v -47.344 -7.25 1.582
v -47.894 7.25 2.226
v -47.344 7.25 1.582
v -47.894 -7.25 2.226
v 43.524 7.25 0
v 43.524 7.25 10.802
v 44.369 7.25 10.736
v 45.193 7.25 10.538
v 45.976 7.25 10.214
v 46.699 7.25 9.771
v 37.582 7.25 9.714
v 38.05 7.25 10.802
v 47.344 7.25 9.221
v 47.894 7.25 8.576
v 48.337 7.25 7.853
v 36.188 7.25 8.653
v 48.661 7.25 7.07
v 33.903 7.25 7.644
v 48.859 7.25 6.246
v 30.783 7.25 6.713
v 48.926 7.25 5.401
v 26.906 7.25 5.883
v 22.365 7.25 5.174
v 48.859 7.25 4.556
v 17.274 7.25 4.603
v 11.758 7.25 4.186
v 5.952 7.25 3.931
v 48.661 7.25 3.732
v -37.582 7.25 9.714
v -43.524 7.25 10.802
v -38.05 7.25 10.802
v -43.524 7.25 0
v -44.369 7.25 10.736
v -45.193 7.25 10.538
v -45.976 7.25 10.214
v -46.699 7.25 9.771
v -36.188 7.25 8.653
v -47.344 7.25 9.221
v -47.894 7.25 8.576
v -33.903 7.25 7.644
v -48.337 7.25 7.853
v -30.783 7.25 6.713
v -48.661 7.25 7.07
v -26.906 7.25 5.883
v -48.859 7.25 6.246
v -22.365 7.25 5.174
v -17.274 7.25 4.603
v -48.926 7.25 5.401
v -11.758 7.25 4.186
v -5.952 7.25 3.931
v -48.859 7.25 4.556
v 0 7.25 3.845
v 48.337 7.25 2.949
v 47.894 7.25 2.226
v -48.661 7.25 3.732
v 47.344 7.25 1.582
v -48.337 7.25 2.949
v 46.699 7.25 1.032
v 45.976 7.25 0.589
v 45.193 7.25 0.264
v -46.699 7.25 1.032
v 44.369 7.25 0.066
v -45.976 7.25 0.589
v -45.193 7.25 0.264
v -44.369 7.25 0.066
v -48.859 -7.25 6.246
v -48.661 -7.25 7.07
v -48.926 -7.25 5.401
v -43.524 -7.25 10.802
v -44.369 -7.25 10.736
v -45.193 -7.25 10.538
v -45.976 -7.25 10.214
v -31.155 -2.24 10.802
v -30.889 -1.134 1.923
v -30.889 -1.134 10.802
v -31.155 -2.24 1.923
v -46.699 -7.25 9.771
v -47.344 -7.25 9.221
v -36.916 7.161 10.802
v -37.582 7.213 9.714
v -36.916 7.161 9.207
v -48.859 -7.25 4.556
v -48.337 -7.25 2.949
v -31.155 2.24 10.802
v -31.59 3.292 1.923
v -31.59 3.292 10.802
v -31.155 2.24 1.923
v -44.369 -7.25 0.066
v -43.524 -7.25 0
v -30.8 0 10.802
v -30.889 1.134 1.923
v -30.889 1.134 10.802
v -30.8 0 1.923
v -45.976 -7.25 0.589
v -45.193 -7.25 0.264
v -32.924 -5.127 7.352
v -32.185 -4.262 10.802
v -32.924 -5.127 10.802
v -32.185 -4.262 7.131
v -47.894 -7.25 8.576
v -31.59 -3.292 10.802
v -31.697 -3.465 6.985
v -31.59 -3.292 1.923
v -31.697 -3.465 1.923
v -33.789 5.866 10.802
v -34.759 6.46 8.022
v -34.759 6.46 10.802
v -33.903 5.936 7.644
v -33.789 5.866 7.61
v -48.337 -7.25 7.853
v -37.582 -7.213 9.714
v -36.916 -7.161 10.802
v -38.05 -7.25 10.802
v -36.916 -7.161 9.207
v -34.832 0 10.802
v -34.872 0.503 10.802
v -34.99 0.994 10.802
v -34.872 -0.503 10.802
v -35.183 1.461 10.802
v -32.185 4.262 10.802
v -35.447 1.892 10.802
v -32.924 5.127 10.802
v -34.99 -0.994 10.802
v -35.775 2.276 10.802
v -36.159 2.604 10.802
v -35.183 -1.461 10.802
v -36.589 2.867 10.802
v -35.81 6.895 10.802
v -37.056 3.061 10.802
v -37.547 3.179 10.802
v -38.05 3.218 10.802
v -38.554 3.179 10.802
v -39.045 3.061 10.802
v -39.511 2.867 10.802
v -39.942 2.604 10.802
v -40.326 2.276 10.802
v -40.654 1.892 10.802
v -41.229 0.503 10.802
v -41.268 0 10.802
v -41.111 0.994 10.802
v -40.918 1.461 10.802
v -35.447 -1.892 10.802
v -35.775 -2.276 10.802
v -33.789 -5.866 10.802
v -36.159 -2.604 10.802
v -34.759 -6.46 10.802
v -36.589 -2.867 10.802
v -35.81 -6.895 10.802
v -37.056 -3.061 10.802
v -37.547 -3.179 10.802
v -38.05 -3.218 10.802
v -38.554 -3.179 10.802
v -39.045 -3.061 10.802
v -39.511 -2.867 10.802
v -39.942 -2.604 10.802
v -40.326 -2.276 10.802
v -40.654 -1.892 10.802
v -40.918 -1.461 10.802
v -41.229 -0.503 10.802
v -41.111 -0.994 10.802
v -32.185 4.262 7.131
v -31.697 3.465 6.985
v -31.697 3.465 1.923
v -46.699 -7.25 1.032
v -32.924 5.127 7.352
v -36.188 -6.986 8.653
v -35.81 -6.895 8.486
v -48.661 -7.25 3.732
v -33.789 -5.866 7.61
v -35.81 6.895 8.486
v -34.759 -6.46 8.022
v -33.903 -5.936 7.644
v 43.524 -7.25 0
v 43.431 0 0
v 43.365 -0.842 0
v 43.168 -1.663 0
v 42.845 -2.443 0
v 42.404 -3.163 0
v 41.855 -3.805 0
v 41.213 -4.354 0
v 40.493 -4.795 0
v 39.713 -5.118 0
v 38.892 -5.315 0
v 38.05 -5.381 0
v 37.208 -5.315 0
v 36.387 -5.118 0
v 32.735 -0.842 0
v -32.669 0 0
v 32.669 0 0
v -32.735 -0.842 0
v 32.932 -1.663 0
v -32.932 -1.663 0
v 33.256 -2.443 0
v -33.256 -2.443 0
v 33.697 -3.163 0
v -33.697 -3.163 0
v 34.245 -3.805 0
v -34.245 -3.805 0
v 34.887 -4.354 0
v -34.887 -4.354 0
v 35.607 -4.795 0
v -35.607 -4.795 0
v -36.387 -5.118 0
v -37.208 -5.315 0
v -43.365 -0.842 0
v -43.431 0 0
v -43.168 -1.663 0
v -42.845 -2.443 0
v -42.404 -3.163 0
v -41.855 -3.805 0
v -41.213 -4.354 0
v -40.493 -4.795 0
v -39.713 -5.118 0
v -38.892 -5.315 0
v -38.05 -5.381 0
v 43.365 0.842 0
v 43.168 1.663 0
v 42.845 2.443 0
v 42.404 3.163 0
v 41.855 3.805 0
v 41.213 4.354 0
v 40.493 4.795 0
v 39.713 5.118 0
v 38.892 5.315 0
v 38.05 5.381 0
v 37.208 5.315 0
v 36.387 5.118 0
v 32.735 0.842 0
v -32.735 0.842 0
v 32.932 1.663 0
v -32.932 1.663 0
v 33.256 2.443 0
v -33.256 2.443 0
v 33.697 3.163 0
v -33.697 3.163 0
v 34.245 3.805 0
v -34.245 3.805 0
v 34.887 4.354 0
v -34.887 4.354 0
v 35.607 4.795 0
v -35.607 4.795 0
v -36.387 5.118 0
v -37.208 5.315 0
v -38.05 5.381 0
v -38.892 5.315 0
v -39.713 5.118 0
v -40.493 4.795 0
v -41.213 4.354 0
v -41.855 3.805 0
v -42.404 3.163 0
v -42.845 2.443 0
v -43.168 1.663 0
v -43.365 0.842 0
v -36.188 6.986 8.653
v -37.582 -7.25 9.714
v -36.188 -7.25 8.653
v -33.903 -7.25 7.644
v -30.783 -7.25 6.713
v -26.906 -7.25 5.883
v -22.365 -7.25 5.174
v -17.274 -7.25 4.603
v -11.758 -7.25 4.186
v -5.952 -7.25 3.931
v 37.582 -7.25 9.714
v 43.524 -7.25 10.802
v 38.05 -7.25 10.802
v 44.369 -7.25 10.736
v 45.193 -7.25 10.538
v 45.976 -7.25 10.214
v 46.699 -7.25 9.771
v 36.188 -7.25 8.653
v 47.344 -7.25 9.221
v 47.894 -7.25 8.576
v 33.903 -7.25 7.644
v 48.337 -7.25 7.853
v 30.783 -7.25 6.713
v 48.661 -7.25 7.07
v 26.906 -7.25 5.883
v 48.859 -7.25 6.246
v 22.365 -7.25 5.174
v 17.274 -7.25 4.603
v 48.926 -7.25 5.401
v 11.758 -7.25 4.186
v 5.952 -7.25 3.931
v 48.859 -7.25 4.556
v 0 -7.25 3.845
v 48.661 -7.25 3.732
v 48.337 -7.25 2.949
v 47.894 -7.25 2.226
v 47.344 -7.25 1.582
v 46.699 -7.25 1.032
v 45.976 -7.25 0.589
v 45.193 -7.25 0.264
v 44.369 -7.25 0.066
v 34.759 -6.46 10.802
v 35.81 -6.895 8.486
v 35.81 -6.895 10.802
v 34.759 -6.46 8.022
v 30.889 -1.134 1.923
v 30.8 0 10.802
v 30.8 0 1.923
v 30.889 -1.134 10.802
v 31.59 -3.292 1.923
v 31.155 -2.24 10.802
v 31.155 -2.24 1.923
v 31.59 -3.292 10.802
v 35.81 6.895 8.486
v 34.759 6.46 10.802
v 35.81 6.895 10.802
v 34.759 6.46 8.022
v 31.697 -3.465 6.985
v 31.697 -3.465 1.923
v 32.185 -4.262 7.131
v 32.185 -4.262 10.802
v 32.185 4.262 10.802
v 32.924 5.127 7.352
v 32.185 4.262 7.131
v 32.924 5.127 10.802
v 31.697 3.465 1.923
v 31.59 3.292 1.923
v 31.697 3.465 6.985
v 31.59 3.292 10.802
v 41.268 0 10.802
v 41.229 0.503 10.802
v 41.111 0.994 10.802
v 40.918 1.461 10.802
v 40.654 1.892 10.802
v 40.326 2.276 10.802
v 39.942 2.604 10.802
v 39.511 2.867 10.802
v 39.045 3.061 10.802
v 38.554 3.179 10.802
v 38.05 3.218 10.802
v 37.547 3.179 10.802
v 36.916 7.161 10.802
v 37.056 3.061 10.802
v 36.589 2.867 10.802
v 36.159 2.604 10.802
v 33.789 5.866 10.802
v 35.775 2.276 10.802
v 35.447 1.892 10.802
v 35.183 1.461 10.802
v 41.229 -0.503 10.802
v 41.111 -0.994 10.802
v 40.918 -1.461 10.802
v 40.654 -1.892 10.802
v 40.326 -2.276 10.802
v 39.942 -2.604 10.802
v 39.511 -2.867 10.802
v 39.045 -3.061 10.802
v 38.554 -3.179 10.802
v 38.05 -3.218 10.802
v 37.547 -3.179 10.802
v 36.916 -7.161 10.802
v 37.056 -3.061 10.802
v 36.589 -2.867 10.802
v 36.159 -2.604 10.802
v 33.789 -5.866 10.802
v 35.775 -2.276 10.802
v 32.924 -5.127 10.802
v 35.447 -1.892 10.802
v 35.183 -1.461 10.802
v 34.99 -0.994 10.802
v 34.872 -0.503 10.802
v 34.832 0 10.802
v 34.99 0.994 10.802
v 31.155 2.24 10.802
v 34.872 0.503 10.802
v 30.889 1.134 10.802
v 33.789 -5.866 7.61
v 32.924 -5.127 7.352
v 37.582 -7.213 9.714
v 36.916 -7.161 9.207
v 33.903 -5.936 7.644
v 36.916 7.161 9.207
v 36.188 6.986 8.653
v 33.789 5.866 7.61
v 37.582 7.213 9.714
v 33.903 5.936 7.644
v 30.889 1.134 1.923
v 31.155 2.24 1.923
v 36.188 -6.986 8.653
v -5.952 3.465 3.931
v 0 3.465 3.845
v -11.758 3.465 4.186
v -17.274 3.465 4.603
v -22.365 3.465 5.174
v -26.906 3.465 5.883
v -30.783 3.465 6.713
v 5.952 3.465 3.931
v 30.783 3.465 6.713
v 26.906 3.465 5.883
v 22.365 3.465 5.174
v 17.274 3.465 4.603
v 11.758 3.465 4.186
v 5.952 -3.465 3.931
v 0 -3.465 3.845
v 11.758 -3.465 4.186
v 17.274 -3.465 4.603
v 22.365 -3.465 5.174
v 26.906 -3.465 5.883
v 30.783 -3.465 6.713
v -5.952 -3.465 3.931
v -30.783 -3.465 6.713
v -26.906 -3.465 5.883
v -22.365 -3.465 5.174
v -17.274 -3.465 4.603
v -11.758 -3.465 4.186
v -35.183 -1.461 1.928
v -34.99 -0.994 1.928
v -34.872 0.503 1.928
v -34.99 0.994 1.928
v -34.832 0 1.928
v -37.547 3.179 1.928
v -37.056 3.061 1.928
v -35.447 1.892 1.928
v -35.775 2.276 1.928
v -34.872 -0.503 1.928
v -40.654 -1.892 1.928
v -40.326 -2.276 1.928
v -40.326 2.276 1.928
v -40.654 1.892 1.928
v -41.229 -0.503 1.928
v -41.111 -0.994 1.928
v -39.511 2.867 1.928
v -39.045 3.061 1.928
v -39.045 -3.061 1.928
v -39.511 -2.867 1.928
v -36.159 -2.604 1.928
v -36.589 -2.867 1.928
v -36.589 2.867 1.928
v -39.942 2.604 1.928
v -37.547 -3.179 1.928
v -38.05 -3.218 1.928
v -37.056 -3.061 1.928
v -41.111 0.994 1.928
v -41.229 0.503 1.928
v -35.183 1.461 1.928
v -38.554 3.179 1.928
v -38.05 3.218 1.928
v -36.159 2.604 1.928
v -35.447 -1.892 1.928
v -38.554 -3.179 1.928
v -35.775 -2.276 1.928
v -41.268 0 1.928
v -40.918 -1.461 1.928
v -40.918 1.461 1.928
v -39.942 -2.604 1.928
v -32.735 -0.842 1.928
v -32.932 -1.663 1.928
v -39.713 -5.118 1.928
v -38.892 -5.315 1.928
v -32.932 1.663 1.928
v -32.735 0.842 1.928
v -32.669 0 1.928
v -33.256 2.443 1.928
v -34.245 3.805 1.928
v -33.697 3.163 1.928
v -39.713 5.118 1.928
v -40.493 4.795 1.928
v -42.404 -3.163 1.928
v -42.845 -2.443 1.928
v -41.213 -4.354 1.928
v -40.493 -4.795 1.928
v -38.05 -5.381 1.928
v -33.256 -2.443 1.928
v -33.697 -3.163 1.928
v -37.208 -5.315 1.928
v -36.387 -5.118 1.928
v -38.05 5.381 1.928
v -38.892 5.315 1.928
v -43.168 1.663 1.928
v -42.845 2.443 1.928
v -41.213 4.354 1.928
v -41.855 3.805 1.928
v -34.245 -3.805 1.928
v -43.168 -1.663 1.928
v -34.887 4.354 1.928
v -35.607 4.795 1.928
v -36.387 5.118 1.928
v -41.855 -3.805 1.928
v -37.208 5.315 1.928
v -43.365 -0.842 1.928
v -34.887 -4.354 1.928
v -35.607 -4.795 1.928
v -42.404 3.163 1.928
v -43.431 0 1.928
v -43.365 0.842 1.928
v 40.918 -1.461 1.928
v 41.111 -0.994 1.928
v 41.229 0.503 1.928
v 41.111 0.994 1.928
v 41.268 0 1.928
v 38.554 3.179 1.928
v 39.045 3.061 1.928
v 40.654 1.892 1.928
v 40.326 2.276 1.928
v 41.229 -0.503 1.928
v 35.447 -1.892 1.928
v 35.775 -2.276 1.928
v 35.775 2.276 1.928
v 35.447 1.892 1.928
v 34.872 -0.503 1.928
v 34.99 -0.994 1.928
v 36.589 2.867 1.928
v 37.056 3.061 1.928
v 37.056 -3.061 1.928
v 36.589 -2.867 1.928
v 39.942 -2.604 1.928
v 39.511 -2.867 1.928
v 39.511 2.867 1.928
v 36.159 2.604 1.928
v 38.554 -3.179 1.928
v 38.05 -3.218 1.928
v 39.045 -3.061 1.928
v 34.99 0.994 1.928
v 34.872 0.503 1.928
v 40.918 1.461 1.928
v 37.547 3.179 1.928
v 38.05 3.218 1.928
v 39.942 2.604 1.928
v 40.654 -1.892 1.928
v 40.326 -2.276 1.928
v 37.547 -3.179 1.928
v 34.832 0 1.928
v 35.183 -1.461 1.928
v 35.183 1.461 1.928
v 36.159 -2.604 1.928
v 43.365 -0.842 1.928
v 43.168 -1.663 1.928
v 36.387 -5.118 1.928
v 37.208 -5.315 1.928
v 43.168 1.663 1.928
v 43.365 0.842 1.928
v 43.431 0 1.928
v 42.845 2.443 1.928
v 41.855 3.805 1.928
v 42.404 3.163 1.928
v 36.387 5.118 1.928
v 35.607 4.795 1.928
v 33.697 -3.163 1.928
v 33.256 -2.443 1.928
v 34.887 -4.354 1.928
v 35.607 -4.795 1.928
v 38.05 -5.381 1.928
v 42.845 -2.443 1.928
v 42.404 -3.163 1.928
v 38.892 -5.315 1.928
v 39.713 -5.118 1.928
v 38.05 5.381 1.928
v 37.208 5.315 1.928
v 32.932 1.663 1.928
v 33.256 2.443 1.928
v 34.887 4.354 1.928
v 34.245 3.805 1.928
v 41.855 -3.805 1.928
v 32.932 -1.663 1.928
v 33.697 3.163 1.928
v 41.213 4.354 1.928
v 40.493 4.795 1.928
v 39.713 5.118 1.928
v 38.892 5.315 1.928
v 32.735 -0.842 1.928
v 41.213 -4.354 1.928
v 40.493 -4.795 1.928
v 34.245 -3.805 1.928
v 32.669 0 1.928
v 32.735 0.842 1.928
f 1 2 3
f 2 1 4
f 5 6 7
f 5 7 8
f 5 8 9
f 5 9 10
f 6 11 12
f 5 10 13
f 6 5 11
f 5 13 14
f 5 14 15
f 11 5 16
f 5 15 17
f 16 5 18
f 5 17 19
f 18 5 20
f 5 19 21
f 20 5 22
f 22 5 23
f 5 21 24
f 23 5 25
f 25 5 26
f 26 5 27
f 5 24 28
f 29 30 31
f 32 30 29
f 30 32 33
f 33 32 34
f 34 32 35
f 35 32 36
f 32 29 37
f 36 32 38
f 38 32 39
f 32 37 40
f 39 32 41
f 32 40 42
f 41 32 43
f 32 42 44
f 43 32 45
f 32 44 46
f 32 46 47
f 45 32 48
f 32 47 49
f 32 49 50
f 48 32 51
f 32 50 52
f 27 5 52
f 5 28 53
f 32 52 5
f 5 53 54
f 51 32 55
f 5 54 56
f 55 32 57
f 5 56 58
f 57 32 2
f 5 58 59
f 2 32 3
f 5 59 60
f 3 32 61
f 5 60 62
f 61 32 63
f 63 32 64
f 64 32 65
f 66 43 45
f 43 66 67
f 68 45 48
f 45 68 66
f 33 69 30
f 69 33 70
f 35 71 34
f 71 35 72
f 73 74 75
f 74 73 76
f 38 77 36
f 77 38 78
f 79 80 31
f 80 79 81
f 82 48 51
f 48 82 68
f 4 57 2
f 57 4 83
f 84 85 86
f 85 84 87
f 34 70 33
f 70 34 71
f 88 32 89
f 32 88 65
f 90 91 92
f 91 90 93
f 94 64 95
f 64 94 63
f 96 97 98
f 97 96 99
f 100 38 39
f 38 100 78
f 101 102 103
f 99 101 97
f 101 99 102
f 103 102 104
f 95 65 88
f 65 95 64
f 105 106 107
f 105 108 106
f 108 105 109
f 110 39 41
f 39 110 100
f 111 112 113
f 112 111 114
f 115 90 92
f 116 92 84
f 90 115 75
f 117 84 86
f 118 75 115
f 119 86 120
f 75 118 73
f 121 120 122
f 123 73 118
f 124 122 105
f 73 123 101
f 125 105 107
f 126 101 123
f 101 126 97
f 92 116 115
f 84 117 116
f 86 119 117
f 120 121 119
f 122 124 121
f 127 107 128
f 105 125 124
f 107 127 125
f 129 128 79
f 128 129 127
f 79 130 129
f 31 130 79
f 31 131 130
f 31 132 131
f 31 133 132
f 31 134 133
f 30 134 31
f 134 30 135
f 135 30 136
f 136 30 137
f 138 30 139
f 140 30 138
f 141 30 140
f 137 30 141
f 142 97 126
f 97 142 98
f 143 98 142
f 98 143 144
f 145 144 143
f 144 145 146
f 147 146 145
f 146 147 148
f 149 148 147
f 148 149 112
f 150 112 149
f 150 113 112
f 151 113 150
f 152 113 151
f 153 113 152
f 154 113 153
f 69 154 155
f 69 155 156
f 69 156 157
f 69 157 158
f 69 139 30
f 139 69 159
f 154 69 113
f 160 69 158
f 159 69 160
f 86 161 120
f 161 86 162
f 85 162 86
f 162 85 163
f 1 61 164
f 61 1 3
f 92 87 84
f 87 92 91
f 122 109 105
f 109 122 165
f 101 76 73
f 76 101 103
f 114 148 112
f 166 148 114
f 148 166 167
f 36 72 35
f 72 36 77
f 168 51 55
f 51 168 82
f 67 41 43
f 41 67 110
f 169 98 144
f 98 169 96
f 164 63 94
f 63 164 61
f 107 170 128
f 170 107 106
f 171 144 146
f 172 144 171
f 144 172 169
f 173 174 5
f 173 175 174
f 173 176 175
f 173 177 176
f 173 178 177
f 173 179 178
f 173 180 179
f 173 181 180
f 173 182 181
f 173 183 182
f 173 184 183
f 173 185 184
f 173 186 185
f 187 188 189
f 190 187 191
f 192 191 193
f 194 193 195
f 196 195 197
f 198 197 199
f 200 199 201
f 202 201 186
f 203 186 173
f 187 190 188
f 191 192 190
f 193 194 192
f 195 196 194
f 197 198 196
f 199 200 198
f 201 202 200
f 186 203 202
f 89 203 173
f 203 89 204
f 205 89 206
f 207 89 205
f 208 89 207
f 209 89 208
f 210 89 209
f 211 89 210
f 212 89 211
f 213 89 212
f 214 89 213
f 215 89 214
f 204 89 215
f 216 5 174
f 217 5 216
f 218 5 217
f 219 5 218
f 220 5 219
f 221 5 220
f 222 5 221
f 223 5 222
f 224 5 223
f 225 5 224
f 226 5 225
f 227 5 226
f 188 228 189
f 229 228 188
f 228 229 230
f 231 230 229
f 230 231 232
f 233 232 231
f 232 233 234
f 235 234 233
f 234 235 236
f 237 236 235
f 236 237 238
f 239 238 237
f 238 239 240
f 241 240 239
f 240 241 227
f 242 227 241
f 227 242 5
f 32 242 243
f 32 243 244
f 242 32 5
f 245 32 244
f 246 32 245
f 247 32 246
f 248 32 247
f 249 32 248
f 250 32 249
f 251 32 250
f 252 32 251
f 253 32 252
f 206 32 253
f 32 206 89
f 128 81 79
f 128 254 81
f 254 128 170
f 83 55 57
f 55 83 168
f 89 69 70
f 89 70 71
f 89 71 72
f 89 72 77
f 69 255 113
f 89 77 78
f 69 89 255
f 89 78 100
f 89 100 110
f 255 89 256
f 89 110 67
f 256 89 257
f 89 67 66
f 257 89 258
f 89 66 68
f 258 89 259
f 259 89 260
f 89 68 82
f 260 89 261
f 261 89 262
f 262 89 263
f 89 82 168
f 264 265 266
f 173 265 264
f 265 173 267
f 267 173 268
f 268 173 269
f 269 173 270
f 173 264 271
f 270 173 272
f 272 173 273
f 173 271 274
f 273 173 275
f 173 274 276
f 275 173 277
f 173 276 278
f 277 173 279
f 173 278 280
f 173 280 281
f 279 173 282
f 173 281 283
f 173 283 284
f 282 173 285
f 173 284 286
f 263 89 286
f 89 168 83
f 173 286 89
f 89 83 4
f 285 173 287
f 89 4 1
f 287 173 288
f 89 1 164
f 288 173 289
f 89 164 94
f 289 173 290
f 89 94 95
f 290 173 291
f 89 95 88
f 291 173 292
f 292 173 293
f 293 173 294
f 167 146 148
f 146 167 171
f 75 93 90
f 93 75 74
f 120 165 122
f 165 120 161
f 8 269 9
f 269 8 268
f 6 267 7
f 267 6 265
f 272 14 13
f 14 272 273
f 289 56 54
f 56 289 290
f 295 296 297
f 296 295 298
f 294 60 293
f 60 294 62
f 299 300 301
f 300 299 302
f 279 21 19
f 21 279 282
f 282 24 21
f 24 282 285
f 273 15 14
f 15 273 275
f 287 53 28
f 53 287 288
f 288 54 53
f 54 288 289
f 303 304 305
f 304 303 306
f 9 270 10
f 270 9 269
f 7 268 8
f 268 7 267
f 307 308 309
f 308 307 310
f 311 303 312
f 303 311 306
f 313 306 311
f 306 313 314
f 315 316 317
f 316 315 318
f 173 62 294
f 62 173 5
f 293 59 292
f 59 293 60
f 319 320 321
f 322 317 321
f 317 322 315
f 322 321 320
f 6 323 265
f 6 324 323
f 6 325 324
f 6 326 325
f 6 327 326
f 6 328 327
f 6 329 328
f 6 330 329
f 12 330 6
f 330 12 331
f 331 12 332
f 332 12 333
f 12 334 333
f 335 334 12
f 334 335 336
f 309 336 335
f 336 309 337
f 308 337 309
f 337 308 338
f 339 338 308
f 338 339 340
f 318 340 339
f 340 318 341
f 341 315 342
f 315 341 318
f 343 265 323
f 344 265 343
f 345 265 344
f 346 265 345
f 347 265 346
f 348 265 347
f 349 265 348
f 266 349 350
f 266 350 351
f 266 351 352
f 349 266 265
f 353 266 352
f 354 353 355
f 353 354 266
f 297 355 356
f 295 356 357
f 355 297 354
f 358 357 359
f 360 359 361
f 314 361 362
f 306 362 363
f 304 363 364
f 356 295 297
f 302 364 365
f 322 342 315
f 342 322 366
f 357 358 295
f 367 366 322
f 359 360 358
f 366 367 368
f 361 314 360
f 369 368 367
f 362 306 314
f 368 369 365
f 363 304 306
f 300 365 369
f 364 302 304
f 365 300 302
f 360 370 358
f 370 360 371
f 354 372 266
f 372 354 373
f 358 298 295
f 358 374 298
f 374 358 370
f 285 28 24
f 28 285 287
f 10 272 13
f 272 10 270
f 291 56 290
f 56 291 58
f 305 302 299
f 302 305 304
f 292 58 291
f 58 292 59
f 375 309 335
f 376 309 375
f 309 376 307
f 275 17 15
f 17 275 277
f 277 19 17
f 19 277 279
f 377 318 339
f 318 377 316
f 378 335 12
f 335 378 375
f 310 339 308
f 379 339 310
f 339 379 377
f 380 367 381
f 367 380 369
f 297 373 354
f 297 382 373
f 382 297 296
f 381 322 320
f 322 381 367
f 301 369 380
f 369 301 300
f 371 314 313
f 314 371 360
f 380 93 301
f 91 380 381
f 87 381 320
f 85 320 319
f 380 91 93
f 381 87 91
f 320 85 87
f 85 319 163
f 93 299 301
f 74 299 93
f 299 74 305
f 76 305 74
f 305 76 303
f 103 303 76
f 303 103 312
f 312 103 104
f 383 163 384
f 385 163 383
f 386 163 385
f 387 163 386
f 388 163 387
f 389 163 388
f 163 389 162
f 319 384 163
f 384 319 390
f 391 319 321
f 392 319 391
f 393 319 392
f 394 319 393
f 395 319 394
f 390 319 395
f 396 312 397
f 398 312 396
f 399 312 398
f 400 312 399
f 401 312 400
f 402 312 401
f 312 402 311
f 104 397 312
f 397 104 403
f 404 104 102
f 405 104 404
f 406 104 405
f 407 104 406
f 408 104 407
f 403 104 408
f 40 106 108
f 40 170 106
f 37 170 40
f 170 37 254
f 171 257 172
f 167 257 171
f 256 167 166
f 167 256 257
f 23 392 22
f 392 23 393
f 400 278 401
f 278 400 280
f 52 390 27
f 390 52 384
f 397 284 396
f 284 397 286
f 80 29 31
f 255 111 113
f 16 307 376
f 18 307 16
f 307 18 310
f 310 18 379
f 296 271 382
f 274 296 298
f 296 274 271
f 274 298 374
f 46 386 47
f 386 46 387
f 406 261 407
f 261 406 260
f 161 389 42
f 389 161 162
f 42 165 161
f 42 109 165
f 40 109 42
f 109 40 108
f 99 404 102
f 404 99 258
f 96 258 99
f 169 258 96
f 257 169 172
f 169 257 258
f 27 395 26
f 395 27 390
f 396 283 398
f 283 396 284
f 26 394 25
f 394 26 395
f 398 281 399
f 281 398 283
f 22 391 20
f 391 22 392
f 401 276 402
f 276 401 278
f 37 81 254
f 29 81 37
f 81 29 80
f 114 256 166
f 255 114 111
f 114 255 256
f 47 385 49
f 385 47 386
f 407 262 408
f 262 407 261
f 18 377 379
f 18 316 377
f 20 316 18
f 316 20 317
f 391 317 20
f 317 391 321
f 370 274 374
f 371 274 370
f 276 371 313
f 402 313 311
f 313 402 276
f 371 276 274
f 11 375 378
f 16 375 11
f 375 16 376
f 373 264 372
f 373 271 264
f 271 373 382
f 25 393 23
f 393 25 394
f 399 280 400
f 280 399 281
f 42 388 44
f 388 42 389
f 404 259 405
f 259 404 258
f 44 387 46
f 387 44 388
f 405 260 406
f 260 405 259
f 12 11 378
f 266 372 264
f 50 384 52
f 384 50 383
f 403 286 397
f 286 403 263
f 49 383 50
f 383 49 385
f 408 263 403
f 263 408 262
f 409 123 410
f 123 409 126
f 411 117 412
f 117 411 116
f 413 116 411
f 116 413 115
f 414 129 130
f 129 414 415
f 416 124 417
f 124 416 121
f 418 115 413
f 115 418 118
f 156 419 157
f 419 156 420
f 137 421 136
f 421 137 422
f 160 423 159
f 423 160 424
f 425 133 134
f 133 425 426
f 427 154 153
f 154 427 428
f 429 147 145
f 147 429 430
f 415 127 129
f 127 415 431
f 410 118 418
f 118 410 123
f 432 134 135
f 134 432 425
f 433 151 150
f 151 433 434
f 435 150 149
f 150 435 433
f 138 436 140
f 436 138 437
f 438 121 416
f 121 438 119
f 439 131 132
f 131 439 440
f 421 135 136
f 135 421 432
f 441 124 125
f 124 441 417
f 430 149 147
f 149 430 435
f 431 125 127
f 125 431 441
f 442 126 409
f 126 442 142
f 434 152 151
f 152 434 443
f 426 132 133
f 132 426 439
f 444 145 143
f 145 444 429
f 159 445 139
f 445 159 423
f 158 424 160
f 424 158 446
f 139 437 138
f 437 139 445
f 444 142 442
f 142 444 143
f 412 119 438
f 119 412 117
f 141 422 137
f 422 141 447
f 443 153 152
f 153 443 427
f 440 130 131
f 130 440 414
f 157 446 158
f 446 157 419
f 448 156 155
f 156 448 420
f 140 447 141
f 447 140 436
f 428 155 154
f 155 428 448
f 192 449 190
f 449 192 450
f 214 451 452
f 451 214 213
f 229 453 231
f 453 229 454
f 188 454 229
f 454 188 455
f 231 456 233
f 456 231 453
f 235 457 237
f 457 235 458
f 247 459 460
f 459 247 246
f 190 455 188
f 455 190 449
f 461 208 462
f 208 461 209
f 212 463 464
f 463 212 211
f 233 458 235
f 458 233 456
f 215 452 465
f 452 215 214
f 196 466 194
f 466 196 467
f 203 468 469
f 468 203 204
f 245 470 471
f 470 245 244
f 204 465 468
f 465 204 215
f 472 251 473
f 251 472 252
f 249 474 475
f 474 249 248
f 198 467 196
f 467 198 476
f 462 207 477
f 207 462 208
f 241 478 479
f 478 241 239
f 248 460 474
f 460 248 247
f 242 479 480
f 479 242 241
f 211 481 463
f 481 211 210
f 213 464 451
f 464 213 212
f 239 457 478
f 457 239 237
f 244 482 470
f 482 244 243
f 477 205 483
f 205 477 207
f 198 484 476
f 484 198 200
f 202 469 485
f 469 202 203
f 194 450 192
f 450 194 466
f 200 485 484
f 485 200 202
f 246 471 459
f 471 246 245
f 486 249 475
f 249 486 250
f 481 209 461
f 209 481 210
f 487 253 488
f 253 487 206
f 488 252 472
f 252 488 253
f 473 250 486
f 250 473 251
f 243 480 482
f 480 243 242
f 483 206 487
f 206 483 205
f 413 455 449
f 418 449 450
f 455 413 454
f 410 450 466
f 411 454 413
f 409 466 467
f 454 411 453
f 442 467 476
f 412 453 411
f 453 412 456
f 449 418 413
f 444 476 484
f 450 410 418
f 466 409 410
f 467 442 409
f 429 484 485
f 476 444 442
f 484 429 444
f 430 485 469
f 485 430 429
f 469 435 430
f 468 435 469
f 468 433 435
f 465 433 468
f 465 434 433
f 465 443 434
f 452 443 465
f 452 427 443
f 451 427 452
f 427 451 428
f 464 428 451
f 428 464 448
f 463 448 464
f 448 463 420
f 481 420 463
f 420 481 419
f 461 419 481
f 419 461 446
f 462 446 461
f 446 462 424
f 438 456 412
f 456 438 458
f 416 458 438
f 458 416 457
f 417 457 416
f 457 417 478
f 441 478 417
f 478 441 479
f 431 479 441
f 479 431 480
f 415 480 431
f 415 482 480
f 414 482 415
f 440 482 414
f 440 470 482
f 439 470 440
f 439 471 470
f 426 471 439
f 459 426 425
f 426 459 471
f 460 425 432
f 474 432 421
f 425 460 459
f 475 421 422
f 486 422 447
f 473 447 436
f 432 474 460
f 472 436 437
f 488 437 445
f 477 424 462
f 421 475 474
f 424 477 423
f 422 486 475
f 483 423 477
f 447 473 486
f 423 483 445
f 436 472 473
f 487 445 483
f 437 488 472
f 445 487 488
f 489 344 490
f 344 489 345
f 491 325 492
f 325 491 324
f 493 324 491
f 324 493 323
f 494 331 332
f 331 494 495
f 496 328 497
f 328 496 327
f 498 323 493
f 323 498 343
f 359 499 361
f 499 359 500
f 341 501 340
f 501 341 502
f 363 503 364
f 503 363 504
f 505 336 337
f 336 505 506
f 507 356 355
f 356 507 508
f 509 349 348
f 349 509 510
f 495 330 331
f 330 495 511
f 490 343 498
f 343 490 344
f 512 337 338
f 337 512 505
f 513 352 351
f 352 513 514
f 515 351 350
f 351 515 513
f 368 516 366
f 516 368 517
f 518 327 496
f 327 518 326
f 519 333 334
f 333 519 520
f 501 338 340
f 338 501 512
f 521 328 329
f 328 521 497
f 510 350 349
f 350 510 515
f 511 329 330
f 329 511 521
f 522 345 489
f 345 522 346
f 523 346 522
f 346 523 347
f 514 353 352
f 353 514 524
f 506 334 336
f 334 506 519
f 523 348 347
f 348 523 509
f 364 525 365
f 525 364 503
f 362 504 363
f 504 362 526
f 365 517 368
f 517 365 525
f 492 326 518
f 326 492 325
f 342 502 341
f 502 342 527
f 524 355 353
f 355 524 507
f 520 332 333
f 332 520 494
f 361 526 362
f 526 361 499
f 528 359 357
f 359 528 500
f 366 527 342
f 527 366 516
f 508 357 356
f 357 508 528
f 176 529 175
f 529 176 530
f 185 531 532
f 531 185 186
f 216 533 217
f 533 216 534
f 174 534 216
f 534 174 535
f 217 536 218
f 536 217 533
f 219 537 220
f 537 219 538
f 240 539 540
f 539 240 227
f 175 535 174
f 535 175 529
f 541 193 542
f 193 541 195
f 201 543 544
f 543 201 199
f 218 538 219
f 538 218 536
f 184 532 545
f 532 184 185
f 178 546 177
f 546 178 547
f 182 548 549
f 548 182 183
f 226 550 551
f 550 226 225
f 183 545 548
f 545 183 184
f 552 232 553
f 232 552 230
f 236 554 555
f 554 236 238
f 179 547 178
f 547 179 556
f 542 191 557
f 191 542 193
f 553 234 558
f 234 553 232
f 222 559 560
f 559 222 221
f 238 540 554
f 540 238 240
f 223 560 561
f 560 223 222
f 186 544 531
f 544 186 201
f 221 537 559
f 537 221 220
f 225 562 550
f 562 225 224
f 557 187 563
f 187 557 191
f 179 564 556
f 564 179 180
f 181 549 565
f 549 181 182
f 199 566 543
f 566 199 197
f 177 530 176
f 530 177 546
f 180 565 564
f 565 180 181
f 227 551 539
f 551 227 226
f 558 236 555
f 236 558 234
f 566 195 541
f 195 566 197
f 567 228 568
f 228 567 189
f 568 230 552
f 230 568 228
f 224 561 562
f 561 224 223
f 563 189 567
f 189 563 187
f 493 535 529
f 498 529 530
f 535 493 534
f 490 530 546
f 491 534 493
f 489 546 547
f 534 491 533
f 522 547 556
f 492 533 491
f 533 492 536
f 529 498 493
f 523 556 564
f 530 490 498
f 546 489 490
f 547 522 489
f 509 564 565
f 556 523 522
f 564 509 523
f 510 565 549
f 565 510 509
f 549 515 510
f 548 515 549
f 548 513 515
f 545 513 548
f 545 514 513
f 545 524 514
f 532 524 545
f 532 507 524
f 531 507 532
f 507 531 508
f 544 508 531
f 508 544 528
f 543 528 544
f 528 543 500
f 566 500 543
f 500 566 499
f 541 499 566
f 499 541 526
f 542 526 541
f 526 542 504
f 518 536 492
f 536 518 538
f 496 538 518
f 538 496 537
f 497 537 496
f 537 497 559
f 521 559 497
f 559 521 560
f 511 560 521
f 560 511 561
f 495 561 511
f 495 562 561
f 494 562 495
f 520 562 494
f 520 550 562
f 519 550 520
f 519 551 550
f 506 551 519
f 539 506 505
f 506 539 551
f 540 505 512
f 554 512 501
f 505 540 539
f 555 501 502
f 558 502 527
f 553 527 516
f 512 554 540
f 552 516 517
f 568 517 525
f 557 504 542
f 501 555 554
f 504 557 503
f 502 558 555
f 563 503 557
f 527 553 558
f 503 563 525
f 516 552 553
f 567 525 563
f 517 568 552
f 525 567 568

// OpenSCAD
// file: curvy_block.scad
module quarter_cylinder(
  r = 1,
  h = 1,
  q = 0
) {
  intersection() {
    cylinder(r=r, h=h, center=true);

    translate([0, 0, h/-2]) {
      rotate(90*q) {
        cube(size=[r, r, h]);
      }
    }
  }
}

module curvy_block(
  size=[1, 1, 1],
  r1 = 0,
  r2 = 0,
  r3 = 0,
  r4 = 0,
) {
  hull() {
    translate([size[0]/-2+r1, size[1]/2-r1, 0]) {
      quarter_cylinder(r=max(0.01, r1), h=size[2], q=1);
    }

    translate([size[0]/2-r2, size[1]/2-r2, 0]) {
      quarter_cylinder(r=max(0.01, r2), h=size[2], q=0);
    }

    translate([0, size[1]/-2+r3, size[2]/2-r3]) {
      rotate([0, 90, 0]) {
        quarter_cylinder(r=max(0.01, r3), h=size[0], q=2);
      }
    }

    translate([0, size[1]/-2+r4, size[2]/-2+r4]) {
      rotate([0, 90, 0]) {
        quarter_cylinder(r=max(0.01, r4), h=size[0], q=3);
      }
    }
  }
}
// main file
$fn = 40;

use <curvy_block.scad>;

for_projection = false;

shinkage_correction = 1.05;
slip_allowance = 0.25*shinkage_correction;

module bridge(
  saddle_w = 44/3*4*shinkage_correction,
  saddle_t = 6.35*shinkage_correction+slip_allowance, // 1/4"
  post_h = 8.88,
  post_d = 5.88*shinkage_correction+slip_allowance,
  post_rim_h = 1.66+slip_allowance,
  post_rim_d = 10*shinkage_correction+slip_allowance,
  stud_rim_d = 13.56*shinkage_correction+slip_allowance,
  for_projection = for_projection,
) {
  total_h = post_h+post_rim_h;
  bottom_t = post_rim_h;

  translate([0, 0, for_projection ? 0 : total_h/2]) {
    difference() {
      union() {
        // Side pieces
        for (i=[-1, 1]) {
          translate([(saddle_w+stud_rim_d*1.25)/2/i, 0]) {
            rotate([0, 0, 90*i]) {
              curvy_block(size=[stud_rim_d, stud_rim_d*1.25, total_h], r1=stud_rim_d/2, r2=stud_rim_d/2, r3=total_h/2, r4=total_h/2);
            }
          }
        }

        difference() {
          // Bar
          cube(size=[saddle_w+stud_rim_d, stud_rim_d, total_h], center=true);

          // Saddle slot
          translate([0, 0, bottom_t]) {
            cube(size=[saddle_w+stud_rim_d, saddle_t, total_h], center=true);
          }

          // Scoop
          if (!for_projection) {
            translate([0, 0, total_h/2]) {
              resize([saddle_w+stud_rim_d, stud_rim_d+0.02, total_h*2-bottom_t*4]) {
                rotate([90]) {
                  cylinder(d=1, h=1, center=true);
                }
              }
            }
          }
        }
      }

      // Post holes
      for (i=[-1, 1]) {
        translate([(saddle_w+stud_rim_d)/2/i, 0]) {
          cylinder(d=post_d, h=total_h+0.02, center=true);

          translate([0, 0, (total_h-post_rim_h)/-2]) {
            cylinder(d=post_rim_d, h=post_rim_h+0.01, center=true);
          }
        }
      }
    }
  }
}

if (for_projection) {
  projection(cut=true) bridge();
} else {
  bridge();
}
